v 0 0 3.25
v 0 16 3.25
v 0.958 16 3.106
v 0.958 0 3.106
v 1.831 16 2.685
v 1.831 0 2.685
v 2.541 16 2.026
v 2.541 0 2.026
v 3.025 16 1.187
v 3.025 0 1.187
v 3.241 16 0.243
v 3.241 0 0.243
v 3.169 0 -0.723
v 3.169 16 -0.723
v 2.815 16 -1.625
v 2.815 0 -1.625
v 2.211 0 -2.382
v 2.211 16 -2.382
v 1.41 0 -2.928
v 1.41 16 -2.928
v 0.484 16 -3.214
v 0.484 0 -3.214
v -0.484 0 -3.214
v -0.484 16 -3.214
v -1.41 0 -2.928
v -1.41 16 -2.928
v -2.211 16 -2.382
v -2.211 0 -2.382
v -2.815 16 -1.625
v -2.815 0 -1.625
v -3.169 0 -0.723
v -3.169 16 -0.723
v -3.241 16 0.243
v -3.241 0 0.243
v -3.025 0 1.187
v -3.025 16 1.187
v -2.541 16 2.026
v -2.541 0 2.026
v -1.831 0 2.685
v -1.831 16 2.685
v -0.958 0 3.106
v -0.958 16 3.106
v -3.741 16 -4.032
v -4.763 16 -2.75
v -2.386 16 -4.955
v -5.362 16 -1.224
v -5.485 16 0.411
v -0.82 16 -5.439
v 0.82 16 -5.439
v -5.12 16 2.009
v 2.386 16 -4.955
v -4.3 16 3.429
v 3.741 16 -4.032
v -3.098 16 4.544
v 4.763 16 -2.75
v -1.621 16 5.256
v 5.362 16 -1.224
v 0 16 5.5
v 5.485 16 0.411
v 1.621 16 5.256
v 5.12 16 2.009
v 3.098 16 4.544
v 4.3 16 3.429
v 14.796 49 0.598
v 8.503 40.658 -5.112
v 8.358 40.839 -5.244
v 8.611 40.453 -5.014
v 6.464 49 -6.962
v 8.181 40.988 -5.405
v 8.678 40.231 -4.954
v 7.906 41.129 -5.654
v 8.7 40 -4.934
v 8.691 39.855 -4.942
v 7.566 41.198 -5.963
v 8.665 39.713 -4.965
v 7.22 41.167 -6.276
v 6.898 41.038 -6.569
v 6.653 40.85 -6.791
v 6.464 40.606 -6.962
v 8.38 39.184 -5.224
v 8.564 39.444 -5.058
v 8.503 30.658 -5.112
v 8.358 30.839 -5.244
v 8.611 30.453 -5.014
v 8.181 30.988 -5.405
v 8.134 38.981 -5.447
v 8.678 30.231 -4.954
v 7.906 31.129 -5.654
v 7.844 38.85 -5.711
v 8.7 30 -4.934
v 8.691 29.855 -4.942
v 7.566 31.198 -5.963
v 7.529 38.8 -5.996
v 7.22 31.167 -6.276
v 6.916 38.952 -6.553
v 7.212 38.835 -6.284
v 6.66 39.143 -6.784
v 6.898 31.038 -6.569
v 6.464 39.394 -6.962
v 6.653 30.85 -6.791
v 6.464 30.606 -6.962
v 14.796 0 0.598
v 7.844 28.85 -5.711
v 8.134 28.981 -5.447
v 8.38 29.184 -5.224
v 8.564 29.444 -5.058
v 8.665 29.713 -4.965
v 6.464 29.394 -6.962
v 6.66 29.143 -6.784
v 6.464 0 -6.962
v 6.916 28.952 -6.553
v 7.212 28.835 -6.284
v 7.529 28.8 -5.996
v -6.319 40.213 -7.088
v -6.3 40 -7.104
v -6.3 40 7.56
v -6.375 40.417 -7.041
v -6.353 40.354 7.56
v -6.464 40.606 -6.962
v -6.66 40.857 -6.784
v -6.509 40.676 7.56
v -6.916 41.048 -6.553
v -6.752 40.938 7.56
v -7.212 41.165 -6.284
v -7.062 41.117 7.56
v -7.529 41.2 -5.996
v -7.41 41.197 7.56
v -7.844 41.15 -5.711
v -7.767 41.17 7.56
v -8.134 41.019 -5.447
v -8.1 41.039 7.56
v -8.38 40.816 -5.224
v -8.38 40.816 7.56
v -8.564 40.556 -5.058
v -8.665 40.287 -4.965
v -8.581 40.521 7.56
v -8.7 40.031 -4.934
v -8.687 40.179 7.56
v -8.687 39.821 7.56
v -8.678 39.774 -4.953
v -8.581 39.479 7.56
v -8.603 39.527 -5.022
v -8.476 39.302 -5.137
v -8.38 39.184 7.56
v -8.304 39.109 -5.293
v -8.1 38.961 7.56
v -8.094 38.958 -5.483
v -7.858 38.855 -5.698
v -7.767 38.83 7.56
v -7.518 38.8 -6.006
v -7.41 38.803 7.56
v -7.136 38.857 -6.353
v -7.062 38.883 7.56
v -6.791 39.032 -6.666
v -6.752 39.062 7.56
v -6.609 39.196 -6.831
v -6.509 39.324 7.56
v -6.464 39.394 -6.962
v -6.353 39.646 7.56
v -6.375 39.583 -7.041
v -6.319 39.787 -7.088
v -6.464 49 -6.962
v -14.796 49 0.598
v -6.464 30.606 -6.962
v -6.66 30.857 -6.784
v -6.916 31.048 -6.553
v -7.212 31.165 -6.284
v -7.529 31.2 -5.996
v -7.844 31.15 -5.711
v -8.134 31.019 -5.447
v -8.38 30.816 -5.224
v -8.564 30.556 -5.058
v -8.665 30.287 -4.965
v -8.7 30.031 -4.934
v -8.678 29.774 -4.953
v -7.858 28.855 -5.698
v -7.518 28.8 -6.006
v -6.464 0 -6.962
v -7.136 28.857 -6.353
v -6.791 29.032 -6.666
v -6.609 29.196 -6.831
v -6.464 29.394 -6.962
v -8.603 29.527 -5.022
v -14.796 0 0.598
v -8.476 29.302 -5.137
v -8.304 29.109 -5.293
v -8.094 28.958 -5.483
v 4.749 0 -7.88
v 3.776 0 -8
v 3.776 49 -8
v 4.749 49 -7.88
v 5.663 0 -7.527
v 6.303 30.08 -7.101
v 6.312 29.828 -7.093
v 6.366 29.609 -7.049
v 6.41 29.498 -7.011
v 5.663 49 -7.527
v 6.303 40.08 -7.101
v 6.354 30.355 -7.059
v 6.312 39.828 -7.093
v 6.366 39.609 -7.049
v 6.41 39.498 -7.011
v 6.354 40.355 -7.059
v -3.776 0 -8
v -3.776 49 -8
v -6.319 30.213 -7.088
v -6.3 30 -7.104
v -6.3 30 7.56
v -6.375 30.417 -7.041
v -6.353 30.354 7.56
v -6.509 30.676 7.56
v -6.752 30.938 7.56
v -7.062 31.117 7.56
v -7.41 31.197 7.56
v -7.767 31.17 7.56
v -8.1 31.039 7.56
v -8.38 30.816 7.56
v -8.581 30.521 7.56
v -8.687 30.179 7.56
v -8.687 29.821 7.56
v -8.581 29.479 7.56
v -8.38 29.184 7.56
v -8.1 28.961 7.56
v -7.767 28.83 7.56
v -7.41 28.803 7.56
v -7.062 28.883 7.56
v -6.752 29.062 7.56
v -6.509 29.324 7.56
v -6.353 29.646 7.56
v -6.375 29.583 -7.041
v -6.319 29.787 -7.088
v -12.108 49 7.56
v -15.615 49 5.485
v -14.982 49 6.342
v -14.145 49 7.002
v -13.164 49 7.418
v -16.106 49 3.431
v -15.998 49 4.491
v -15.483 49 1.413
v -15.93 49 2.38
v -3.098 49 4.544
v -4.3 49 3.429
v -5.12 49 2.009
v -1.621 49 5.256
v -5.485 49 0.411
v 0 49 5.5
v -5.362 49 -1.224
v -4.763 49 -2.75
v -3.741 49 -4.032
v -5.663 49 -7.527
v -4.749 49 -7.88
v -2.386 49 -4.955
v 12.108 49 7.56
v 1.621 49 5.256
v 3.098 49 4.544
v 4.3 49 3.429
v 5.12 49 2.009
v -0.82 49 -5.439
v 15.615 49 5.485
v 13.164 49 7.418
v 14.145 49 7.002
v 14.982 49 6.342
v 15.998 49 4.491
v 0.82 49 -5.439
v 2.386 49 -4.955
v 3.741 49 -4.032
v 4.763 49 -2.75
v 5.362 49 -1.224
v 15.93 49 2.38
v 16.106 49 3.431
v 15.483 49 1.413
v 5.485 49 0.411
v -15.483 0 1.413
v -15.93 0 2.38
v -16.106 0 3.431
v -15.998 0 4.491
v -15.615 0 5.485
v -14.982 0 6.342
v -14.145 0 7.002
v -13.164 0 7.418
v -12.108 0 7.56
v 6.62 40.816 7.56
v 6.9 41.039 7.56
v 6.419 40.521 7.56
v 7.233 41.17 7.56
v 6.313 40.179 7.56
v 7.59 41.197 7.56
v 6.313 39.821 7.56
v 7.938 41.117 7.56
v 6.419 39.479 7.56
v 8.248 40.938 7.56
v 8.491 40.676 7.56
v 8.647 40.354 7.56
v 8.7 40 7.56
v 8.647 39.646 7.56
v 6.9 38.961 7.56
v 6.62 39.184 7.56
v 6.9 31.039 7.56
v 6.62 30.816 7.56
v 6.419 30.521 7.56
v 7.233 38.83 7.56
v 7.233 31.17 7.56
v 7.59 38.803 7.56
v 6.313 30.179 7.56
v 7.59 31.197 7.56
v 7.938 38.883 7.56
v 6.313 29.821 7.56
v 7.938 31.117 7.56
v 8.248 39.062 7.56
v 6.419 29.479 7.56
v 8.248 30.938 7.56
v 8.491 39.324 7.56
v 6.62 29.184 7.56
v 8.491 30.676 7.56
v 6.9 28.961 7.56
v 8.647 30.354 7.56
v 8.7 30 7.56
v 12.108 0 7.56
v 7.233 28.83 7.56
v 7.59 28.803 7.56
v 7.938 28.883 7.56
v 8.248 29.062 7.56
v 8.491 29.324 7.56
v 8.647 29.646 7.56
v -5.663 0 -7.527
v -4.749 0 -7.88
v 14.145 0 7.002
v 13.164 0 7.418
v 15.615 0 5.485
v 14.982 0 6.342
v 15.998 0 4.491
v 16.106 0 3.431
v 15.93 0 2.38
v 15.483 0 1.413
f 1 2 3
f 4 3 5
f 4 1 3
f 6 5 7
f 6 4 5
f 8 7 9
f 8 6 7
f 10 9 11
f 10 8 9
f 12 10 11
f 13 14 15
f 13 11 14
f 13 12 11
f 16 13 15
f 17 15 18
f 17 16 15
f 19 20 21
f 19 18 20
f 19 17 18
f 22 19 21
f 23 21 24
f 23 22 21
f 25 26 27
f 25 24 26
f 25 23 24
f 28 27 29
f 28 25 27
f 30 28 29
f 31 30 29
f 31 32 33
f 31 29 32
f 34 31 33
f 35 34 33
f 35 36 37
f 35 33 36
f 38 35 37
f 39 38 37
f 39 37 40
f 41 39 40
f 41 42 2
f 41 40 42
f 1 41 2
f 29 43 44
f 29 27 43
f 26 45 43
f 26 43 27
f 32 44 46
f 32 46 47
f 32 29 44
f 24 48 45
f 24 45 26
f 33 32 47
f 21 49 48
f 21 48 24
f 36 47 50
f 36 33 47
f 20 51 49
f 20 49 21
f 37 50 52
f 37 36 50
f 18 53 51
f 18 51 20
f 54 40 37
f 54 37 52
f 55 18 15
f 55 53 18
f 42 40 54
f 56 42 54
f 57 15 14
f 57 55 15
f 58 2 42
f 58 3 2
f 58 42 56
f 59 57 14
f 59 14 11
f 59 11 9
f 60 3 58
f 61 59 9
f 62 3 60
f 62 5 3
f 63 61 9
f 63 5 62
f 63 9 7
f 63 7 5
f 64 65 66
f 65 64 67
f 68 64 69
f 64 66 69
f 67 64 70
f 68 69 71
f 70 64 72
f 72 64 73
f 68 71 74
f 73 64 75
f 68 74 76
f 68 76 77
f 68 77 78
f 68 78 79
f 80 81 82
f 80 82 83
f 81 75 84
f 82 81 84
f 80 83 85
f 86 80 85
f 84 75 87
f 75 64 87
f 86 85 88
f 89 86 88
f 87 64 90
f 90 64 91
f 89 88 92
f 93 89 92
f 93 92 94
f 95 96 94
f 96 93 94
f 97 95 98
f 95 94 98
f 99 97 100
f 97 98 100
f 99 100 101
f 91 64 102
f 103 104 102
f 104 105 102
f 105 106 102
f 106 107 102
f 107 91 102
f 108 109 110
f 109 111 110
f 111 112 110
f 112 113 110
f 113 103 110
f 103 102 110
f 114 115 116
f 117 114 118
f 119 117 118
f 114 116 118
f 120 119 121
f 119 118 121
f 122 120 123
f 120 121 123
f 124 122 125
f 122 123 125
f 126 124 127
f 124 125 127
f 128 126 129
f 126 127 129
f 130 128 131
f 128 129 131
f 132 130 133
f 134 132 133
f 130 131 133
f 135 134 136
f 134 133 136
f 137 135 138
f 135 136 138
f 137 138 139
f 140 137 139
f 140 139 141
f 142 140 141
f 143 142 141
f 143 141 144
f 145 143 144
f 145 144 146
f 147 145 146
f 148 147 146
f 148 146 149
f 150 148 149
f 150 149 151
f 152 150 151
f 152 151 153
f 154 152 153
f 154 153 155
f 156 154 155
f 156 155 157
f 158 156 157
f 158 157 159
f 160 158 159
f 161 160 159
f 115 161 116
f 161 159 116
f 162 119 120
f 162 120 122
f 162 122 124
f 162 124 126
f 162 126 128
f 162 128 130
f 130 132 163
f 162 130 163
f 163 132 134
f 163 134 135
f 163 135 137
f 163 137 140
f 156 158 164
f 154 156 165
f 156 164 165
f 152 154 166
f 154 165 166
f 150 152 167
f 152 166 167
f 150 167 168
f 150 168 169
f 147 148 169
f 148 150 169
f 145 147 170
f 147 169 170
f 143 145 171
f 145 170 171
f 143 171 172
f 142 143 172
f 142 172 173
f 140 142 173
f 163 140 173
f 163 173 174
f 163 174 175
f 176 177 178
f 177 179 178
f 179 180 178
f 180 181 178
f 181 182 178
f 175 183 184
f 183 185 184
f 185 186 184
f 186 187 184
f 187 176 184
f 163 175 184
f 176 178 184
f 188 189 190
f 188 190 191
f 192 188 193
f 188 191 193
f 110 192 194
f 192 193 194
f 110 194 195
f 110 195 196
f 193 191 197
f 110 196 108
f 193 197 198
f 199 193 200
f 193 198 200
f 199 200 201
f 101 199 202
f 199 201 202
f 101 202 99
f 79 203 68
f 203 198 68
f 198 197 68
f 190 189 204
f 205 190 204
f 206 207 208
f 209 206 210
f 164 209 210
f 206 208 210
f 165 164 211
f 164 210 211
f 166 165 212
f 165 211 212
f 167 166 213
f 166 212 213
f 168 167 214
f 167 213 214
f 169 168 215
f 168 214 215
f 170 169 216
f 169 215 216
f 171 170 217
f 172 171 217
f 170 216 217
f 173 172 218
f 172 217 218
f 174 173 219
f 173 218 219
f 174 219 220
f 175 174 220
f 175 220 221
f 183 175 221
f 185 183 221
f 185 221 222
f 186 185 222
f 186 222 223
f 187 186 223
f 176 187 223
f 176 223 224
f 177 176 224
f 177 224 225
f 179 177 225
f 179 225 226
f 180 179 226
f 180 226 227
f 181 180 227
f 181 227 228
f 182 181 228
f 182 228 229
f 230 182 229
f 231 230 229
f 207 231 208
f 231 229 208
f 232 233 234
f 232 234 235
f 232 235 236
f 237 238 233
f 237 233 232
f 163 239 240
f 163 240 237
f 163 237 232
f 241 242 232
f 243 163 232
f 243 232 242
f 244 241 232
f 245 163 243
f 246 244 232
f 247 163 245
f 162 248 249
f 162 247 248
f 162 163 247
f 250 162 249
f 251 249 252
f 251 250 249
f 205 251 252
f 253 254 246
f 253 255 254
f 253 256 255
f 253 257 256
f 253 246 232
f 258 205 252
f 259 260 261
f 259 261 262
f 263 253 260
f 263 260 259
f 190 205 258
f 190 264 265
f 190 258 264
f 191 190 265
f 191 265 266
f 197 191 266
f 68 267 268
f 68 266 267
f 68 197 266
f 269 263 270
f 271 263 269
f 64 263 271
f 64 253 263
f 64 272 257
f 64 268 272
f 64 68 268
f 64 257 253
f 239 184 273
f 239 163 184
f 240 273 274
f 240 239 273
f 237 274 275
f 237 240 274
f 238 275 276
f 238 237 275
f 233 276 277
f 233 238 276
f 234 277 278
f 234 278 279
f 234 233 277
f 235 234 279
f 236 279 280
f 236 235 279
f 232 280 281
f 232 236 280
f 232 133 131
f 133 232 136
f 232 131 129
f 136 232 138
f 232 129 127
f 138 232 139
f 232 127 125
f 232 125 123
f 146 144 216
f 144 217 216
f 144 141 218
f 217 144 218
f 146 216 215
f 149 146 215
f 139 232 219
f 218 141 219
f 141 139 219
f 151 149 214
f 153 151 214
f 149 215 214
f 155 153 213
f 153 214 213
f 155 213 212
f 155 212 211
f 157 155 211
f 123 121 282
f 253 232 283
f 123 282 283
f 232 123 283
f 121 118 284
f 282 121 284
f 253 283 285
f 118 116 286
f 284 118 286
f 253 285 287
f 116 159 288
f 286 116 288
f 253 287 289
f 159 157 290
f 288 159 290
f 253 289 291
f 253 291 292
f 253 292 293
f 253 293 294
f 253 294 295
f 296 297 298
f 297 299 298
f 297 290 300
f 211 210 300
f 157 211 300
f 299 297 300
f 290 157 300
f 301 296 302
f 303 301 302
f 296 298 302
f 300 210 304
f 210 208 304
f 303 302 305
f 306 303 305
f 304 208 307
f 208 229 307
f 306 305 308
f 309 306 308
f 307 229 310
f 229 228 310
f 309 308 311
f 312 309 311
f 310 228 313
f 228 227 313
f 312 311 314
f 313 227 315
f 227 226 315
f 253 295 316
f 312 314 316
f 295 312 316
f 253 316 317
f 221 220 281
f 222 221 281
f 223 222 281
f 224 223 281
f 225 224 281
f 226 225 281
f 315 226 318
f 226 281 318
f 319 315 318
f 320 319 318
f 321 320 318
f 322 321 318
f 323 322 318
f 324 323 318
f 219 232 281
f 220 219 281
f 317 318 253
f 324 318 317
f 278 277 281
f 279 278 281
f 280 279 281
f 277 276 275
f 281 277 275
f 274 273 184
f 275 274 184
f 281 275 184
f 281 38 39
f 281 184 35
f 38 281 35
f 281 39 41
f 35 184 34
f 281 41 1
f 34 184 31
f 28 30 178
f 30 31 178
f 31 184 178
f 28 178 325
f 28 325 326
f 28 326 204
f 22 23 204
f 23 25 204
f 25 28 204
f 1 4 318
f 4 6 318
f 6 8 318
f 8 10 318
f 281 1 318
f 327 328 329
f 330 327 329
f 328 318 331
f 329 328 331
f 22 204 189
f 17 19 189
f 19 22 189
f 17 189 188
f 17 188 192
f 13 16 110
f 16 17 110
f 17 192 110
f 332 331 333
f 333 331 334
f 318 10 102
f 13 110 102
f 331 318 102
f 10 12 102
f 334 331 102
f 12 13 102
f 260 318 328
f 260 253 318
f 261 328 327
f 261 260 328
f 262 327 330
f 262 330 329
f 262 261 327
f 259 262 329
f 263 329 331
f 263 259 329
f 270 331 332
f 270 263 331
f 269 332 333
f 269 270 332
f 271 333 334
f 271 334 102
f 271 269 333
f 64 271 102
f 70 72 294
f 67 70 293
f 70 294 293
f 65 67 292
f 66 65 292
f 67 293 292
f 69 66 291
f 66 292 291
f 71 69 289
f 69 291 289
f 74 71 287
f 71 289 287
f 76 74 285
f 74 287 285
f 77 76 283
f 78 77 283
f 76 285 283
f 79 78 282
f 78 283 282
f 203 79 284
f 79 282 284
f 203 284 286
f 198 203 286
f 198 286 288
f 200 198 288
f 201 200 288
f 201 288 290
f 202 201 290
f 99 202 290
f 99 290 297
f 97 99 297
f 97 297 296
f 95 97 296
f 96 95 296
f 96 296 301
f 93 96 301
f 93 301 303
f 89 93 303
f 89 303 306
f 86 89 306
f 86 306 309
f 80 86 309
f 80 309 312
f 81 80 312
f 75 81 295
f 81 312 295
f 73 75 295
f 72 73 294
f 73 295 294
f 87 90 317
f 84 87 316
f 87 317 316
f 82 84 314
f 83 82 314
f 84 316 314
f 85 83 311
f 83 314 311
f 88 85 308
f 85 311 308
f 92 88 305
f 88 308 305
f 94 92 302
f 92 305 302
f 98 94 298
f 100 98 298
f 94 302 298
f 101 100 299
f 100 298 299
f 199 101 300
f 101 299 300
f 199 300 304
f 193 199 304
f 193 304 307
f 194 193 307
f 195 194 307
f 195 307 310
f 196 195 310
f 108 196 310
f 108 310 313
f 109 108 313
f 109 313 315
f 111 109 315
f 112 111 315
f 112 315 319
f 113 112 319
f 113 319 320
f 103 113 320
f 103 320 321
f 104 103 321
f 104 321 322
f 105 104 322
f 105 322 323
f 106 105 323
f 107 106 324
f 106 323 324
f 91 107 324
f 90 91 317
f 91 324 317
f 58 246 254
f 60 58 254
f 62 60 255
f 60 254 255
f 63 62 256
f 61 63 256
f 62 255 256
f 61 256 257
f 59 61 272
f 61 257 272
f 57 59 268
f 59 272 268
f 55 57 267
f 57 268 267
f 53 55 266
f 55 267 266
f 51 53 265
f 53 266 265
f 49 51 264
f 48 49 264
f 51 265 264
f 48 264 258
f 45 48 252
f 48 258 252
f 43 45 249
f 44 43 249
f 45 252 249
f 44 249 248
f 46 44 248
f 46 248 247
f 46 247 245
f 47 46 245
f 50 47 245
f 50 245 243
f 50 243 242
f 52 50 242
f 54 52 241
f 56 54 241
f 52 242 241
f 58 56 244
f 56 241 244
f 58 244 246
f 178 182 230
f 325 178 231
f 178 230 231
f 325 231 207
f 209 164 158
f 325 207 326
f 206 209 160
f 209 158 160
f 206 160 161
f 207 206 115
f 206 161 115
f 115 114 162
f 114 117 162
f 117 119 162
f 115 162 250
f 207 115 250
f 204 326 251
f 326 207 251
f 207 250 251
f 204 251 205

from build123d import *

# Parameters (mm, degrees)
SKETCH1_R           = 3.25
BOSS_EXTRUDE1_DEPTH = 49
FILLET1_R           = 4
SKETCH2_R           = 5.5
CUT_EXTRUDE1_DEPTH  = 33
SKETCH3_R           = 1.2
CUT_EXTRUDE2_DEPTH  = 54.875656369


with BuildPart() as part:
    # Sketch1 → Boss-Extrude1 (new body)
    with BuildSketch(Plane(origin=(0, 0, 0), x_dir=(1, 0, 0), z_dir=(0, 1, 0))):
        Polygon((-5.320759509, 8), (-22.469015665, -7.56), (22.469015665, -7.56), (5.320759509, 8), align=None)
        with Locations(Location((0, 0, 0), (0, 0, 270))):
            Circle(SKETCH1_R, mode=Mode.SUBTRACT)
    extrude(amount=BOSS_EXTRUDE1_DEPTH)

    # Fillet1
    fillet1_edges = [part.edges().sort_by_distance(p)[0] for p in [
        (5.320759509, 24.5, -8),
        (22.469015665, 24.5, 7.56),
        (-22.469015665, 24.5, 7.56),
        (-5.320759509, 24.5, -8),
    ]]
    fillet(fillet1_edges, radius=FILLET1_R)

    # Sketch2 → Cut-Extrude1 (cut)
    with BuildSketch(Plane(origin=(0, 49, 0), x_dir=(1, 0, 0), z_dir=(0, 1, 0))):
        with Locations(Location((0, 0, 0), (0, 0, 270))):
            Circle(SKETCH2_R)
    extrude(amount=-CUT_EXTRUDE1_DEPTH, mode=Mode.SUBTRACT)

    # Sketch3 → Cut-Extrude2 (cut, through all)
    with BuildSketch(Plane.XY.offset(7.56)):
        with Locations((-7.5, 40)):
            Circle(SKETCH3_R)
        with Locations((7.5, 40)):
            Circle(SKETCH3_R)
        with Locations((7.5, 30)):
            Circle(SKETCH3_R)
        with Locations((-7.5, 30)):
            Circle(SKETCH3_R)
    extrude(amount=-CUT_EXTRUDE2_DEPTH, mode=Mode.SUBTRACT)


solid = part.part
